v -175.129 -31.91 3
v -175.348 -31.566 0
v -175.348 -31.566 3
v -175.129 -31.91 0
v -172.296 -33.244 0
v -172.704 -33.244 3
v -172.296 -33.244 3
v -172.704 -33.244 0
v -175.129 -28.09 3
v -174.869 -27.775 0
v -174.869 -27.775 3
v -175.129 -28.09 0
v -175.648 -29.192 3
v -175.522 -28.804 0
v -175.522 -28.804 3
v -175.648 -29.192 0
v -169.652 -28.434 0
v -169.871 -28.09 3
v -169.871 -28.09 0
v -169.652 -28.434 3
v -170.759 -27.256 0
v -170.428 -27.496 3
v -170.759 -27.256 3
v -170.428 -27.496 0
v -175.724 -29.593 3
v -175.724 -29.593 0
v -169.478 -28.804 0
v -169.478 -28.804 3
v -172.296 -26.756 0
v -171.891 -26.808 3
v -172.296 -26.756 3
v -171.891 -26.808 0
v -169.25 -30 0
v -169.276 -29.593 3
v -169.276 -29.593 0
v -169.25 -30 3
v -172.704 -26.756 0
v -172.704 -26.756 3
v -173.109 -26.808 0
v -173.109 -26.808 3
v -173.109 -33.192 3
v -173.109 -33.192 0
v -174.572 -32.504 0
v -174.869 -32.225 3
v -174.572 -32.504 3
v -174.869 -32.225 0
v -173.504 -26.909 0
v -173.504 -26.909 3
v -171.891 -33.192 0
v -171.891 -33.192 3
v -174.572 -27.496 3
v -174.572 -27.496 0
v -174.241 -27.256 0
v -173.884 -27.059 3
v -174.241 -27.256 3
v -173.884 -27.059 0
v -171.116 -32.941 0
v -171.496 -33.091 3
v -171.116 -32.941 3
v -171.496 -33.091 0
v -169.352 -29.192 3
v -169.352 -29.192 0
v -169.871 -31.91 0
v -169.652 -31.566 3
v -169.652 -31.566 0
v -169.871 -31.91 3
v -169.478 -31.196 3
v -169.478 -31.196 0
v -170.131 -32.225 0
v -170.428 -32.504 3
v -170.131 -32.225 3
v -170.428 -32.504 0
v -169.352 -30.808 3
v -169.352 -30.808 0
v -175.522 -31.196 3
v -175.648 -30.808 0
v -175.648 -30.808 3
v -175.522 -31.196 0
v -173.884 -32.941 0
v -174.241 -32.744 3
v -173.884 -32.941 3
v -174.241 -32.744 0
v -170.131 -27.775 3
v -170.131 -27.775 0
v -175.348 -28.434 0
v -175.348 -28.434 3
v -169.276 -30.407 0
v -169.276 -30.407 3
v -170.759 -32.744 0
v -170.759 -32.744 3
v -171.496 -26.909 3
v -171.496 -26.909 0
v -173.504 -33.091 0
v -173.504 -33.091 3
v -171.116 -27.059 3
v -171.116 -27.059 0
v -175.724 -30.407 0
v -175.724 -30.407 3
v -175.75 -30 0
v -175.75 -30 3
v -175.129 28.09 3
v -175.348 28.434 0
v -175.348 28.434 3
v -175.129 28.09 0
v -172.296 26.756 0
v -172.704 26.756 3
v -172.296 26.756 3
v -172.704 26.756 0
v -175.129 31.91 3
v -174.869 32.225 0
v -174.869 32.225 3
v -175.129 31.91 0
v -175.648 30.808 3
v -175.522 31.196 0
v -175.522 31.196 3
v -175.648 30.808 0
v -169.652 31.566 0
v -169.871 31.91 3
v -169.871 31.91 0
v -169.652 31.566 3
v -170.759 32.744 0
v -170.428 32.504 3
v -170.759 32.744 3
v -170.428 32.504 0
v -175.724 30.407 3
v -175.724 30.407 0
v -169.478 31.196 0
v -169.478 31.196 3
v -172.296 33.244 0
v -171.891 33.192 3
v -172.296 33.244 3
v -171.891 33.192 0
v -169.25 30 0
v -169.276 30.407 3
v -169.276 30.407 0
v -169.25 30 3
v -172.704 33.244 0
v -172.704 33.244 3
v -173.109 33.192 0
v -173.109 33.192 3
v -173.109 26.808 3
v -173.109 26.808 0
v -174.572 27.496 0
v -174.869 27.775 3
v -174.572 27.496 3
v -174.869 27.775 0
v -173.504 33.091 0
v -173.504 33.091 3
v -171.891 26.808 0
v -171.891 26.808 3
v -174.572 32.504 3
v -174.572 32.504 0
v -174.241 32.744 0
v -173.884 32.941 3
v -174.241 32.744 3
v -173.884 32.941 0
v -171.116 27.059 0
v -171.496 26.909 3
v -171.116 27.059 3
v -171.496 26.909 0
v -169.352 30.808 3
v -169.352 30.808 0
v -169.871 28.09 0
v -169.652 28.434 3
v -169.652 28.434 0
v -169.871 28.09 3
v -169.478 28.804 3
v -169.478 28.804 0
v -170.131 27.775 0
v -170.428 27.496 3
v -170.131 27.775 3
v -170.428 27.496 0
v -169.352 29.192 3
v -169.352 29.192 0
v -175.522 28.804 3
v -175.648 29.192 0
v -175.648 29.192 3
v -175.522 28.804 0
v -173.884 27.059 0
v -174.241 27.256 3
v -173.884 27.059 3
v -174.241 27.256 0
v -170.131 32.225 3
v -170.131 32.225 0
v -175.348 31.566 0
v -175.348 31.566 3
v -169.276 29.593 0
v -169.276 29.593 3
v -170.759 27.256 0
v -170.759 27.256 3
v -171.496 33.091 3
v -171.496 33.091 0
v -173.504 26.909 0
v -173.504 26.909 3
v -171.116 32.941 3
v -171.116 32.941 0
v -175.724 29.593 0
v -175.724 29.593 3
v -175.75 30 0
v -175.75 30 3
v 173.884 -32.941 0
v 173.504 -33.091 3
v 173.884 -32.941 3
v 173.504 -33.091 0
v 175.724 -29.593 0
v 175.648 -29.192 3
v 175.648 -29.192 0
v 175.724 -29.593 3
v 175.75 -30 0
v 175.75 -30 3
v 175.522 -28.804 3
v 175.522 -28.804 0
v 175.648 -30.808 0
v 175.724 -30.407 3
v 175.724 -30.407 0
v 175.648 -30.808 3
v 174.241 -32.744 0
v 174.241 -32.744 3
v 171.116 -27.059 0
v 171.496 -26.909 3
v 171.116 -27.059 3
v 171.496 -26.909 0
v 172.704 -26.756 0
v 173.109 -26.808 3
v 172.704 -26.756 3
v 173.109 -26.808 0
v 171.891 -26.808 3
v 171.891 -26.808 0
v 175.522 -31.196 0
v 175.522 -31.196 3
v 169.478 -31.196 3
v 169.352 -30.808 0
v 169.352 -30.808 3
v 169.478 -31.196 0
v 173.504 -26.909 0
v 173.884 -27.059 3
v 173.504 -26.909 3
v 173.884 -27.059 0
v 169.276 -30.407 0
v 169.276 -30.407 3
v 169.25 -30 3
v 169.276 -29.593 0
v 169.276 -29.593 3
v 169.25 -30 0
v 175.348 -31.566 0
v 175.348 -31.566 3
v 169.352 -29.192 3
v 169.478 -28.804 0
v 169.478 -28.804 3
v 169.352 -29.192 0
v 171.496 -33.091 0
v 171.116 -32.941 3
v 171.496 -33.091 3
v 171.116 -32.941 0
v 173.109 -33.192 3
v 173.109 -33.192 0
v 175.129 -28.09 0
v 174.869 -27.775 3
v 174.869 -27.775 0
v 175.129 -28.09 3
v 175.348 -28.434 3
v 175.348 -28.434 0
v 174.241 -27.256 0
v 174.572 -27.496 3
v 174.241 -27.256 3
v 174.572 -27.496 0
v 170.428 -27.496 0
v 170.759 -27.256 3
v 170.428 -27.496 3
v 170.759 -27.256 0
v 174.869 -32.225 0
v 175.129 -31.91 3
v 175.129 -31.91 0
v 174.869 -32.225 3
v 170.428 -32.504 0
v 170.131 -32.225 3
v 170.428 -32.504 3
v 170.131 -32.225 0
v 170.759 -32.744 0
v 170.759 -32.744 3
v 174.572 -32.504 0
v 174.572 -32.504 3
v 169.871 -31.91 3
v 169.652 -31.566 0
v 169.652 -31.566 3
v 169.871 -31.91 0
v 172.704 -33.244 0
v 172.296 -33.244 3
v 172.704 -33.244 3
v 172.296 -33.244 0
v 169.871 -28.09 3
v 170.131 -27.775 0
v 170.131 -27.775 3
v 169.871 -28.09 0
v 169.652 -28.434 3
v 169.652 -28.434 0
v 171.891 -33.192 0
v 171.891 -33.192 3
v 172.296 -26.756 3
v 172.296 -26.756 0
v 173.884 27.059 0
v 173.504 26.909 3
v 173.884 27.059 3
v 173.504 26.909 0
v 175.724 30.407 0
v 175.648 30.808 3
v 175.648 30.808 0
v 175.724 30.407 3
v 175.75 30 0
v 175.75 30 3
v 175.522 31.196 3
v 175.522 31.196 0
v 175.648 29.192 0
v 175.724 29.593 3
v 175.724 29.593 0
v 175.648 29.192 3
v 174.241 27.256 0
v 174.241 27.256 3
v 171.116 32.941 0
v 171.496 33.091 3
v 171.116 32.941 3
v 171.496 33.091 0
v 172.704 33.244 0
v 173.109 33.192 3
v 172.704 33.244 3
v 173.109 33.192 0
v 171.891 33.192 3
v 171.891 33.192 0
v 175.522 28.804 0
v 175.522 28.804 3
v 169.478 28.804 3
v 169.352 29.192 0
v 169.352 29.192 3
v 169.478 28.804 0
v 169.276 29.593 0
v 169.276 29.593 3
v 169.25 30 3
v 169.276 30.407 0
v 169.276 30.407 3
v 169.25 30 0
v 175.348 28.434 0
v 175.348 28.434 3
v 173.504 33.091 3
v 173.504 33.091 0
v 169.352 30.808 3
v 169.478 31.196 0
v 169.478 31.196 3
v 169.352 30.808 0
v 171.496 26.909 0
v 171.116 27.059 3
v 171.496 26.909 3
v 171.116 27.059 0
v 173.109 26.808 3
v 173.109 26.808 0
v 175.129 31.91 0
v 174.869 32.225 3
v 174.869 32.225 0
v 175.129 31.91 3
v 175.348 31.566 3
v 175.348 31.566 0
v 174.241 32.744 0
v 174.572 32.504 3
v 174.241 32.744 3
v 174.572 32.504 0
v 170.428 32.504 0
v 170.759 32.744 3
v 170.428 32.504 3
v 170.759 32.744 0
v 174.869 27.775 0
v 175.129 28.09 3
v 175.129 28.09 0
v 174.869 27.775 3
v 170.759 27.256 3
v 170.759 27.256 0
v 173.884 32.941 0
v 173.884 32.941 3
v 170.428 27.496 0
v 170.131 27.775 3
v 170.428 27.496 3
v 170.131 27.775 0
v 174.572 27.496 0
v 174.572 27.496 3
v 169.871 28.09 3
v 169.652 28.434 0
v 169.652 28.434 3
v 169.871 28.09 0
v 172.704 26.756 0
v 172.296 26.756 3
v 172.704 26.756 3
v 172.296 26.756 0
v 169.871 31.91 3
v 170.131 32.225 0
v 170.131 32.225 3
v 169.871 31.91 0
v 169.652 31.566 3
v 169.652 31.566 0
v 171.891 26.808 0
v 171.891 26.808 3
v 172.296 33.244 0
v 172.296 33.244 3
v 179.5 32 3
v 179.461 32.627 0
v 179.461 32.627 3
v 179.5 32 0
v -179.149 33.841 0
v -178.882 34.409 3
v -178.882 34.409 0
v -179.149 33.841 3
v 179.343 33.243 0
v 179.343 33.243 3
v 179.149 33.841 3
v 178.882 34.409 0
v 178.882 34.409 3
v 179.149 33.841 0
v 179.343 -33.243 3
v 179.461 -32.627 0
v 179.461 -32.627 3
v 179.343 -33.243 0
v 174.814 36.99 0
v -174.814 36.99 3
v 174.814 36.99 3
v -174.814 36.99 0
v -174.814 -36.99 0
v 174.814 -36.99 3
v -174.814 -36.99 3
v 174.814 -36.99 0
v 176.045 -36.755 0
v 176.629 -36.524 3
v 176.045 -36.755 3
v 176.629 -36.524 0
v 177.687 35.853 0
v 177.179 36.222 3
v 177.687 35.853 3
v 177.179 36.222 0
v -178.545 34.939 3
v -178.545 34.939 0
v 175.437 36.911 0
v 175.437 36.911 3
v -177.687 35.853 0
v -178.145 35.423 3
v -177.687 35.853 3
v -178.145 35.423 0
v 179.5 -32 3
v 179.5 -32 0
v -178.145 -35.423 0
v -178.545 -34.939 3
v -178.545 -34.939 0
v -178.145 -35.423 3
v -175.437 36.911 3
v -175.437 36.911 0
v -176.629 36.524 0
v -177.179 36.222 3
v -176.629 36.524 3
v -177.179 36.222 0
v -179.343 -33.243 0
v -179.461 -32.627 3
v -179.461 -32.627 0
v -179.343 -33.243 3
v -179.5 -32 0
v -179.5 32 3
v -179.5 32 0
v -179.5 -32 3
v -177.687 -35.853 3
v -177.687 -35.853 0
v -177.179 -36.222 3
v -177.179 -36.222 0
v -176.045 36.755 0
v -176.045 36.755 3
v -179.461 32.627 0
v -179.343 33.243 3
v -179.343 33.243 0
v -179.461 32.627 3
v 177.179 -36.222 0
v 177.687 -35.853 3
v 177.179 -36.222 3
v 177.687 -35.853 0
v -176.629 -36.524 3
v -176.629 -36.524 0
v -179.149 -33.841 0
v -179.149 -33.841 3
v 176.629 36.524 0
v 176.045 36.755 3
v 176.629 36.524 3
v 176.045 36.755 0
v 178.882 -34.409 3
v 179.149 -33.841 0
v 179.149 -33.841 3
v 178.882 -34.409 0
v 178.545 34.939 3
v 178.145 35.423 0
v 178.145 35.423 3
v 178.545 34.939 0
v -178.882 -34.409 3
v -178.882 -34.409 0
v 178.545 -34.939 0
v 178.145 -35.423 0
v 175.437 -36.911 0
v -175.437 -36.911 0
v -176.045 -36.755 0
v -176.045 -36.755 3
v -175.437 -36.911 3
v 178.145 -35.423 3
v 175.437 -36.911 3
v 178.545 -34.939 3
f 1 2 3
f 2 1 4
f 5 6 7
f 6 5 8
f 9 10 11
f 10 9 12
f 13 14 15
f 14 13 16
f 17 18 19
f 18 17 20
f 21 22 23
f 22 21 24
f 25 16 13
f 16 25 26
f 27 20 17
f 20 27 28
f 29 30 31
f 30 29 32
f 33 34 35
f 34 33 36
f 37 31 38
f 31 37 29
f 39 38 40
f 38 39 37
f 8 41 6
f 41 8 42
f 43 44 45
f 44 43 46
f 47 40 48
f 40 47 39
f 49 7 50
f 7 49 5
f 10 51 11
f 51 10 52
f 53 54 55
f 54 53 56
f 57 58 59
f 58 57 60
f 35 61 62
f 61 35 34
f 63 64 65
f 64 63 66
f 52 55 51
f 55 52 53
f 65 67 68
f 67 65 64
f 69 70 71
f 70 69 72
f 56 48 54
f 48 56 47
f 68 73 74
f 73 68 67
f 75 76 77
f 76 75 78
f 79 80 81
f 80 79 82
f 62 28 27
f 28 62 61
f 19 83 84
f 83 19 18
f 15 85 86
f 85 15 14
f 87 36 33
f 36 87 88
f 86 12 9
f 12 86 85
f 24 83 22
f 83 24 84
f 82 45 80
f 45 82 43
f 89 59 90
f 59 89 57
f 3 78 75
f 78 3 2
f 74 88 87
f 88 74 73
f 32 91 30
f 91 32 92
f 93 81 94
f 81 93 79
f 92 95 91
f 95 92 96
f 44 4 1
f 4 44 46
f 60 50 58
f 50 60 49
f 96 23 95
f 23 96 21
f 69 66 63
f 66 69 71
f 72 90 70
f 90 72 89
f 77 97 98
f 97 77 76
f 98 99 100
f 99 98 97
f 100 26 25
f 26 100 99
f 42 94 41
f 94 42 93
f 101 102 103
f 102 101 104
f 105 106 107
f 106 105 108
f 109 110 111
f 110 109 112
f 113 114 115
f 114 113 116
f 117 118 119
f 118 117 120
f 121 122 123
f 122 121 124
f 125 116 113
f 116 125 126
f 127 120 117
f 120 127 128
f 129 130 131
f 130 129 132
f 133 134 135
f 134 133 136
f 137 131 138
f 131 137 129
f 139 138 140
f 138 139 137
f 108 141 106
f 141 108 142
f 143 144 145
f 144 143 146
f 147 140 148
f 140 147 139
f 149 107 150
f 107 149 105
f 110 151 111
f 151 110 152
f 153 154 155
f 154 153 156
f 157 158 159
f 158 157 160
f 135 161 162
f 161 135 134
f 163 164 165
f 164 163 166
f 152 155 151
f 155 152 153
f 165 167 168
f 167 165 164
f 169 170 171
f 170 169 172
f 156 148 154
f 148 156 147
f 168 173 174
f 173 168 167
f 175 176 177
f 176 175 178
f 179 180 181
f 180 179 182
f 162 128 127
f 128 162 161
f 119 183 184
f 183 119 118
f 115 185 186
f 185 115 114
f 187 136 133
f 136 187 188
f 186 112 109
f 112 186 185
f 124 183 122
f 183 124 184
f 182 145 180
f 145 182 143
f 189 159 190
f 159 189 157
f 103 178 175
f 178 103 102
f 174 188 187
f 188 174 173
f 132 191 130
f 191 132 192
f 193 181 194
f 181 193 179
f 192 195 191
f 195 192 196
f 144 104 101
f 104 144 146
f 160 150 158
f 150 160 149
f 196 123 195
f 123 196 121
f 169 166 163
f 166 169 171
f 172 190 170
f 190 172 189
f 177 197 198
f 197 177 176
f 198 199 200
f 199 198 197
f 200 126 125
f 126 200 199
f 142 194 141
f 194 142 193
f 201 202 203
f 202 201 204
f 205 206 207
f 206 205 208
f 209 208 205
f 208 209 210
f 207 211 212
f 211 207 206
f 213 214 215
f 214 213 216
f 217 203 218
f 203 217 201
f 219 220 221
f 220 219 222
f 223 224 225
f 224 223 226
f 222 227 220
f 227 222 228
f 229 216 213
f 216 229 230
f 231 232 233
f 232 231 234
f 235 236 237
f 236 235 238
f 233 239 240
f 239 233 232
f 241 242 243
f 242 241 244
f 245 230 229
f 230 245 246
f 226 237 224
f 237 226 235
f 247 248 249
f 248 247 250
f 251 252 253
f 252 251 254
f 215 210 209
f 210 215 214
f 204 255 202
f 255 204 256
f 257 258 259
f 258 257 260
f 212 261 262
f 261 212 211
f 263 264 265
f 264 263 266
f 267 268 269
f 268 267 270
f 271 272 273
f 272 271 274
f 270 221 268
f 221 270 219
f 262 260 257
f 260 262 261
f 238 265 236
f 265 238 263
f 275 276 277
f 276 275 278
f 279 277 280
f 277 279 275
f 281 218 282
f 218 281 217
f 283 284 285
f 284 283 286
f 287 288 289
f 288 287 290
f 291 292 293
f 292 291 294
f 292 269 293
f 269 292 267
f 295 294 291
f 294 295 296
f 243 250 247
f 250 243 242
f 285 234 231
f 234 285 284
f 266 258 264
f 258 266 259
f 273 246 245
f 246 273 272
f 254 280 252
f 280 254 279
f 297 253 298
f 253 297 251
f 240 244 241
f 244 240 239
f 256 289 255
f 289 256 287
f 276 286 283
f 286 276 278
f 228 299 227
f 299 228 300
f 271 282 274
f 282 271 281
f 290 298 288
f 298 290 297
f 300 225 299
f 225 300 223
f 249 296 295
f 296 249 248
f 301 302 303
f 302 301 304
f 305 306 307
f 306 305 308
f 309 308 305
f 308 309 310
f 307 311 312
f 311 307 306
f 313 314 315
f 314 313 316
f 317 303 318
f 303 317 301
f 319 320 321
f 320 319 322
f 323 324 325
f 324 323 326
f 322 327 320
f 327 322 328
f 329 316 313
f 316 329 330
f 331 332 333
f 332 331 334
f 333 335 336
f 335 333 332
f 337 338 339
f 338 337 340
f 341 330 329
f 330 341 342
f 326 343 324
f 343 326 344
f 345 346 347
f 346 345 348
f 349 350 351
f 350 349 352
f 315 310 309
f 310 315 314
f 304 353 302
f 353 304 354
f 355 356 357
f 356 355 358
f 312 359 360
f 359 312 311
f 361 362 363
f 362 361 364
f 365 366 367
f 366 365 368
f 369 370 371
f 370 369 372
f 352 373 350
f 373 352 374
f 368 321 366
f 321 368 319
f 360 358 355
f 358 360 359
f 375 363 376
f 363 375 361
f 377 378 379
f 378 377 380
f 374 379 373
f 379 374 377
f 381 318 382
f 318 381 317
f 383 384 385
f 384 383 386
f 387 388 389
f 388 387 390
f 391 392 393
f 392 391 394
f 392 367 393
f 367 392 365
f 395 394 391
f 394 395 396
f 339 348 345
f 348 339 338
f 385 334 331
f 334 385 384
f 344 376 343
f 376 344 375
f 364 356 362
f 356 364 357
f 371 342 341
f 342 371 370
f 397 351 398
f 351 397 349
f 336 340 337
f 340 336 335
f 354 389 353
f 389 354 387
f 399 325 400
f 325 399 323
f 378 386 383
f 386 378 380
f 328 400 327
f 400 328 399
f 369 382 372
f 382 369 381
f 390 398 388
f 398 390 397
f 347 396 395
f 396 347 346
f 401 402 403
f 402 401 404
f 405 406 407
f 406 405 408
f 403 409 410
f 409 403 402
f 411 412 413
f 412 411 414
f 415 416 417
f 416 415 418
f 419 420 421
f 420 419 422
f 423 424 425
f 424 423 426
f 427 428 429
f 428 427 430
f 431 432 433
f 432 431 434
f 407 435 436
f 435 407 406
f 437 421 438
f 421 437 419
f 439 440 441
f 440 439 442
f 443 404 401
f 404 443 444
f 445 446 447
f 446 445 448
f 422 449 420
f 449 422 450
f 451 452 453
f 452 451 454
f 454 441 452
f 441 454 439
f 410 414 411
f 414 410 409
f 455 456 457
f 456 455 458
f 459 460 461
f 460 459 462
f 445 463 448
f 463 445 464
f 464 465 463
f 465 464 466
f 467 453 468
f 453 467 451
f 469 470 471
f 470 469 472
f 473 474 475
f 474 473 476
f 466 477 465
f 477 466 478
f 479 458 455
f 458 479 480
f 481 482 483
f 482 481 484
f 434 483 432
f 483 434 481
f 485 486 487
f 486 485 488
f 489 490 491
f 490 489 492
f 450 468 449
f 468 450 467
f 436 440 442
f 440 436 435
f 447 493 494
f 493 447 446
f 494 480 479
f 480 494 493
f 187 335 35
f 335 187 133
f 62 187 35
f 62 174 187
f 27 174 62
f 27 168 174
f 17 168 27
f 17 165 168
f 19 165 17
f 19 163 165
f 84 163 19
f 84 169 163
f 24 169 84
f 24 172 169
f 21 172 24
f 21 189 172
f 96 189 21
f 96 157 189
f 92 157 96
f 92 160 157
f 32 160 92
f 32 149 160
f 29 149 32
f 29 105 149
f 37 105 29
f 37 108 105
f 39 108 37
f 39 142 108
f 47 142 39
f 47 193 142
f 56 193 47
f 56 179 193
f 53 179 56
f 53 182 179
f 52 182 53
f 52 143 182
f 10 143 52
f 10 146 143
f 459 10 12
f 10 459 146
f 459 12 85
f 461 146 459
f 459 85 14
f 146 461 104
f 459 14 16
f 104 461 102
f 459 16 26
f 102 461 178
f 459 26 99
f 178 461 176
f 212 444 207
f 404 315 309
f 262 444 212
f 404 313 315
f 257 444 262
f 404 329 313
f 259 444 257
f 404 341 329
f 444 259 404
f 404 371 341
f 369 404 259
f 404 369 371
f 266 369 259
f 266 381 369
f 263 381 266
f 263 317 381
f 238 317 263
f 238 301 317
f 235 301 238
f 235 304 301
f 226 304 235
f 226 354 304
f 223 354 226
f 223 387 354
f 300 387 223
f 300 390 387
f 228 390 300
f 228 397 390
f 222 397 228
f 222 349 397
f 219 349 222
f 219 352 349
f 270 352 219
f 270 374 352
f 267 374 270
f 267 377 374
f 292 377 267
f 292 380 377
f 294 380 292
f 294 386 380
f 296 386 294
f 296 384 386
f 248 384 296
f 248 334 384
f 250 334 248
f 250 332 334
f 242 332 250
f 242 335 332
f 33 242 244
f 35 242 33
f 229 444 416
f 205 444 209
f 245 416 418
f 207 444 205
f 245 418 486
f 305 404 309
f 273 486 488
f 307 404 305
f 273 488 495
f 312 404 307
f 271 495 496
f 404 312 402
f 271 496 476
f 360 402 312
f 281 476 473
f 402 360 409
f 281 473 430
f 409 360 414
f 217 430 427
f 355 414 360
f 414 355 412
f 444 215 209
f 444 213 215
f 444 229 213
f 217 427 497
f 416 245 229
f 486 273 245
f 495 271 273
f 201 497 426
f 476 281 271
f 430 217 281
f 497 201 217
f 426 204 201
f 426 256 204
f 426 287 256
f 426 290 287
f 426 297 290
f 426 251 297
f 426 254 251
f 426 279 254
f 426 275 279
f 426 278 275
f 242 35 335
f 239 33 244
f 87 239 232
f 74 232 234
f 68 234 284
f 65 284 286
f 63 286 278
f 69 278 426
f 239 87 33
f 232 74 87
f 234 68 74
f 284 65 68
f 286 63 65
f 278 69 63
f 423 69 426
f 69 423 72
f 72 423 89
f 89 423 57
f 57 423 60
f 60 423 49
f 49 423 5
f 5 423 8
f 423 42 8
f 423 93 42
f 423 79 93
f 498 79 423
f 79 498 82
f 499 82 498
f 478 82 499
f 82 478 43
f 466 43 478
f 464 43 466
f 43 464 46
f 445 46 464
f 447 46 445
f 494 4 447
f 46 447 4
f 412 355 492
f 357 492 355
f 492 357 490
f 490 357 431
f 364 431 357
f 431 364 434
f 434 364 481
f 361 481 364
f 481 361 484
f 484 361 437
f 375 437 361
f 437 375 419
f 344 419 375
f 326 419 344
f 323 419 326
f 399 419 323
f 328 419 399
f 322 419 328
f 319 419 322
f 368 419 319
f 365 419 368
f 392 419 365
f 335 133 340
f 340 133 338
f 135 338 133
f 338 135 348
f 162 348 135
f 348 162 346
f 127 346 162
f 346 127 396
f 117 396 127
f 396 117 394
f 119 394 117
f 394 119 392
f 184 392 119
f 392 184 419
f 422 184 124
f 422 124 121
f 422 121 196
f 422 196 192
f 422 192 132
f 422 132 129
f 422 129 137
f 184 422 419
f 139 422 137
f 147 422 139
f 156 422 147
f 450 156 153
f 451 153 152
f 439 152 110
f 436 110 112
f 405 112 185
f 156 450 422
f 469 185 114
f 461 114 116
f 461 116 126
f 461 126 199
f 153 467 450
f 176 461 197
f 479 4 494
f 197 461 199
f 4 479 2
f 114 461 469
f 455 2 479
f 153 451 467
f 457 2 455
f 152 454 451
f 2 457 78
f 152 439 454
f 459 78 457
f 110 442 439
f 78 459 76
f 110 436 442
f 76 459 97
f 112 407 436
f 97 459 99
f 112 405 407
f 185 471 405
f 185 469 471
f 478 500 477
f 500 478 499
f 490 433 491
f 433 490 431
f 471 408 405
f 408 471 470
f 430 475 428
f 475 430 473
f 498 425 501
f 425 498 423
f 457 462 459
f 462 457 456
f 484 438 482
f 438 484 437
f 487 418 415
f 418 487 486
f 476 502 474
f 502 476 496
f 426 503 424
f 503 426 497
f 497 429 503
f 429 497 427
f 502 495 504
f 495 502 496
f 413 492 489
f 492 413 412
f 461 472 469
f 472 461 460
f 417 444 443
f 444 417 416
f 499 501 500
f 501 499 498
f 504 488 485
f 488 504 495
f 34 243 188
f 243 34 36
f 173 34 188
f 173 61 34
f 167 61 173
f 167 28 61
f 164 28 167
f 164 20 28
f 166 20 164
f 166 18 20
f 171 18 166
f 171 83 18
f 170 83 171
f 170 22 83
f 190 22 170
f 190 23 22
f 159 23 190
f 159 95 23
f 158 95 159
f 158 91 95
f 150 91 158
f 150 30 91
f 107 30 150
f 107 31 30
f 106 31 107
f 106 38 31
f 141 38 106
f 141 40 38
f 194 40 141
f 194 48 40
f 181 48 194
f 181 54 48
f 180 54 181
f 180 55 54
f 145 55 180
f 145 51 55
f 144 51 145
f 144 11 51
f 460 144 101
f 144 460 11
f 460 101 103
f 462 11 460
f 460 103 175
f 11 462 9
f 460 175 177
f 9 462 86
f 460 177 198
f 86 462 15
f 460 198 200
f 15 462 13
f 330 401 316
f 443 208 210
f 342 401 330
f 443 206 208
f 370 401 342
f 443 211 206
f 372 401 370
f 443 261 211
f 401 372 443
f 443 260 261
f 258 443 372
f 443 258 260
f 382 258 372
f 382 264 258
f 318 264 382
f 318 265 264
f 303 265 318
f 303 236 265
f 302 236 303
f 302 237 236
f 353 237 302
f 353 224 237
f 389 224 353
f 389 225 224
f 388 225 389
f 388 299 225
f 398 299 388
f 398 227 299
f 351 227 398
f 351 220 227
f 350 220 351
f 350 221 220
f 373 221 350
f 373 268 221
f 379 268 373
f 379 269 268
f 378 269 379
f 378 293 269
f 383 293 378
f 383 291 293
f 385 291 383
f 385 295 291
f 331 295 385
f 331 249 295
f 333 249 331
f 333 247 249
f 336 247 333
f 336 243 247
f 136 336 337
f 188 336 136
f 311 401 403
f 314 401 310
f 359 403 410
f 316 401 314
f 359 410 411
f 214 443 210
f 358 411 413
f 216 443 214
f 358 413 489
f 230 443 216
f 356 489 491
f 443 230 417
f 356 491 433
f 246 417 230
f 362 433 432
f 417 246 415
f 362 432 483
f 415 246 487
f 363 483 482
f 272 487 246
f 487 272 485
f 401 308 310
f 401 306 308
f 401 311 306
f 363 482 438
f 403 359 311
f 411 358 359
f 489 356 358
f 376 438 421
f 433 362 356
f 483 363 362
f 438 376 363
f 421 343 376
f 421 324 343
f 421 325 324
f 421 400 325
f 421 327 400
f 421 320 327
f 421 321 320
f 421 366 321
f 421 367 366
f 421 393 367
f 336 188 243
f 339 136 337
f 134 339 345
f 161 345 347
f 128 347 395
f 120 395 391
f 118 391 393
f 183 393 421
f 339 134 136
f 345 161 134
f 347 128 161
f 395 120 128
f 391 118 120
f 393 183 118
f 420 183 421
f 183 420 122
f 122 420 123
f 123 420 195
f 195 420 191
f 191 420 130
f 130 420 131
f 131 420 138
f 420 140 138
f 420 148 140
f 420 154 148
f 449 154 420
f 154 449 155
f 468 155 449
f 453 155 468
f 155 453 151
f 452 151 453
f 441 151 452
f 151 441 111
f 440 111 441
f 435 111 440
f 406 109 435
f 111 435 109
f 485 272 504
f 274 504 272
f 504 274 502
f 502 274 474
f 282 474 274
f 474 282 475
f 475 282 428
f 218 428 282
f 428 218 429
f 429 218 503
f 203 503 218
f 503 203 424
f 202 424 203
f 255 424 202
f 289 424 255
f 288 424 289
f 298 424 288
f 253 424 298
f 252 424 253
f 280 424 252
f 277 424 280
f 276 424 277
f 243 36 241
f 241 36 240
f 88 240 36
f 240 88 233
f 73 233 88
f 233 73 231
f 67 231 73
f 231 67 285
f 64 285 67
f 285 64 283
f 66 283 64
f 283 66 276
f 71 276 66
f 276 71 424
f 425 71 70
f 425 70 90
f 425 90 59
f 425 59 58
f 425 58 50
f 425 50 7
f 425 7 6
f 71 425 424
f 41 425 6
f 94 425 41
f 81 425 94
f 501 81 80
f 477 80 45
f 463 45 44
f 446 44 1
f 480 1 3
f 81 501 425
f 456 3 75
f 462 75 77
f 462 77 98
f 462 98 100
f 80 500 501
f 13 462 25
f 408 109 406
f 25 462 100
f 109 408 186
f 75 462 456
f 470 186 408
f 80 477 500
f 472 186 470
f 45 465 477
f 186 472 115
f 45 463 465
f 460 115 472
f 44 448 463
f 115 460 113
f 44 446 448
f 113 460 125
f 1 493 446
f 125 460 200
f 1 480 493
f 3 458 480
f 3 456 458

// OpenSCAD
$fn = 50;


difference() {
	union() {
		hull() {
			translate(v = [-174.5000000000, 32.0000000000, 0]) {
				cylinder(h = 3, r = 5);
			}
			translate(v = [174.5000000000, 32.0000000000, 0]) {
				cylinder(h = 3, r = 5);
			}
			translate(v = [-174.5000000000, -32.0000000000, 0]) {
				cylinder(h = 3, r = 5);
			}
			translate(v = [174.5000000000, -32.0000000000, 0]) {
				cylinder(h = 3, r = 5);
			}
		}
	}
	union() {
		translate(v = [-172.5000000000, -30.0000000000, -100.0000000000]) {
			cylinder(h = 200, r = 3.2500000000);
		}
		translate(v = [-172.5000000000, 30.0000000000, -100.0000000000]) {
			cylinder(h = 200, r = 3.2500000000);
		}
		translate(v = [172.5000000000, -30.0000000000, -100.0000000000]) {
			cylinder(h = 200, r = 3.2500000000);
		}
		translate(v = [172.5000000000, 30.0000000000, -100.0000000000]) {
			cylinder(h = 200, r = 3.2500000000);
		}
	}
}
